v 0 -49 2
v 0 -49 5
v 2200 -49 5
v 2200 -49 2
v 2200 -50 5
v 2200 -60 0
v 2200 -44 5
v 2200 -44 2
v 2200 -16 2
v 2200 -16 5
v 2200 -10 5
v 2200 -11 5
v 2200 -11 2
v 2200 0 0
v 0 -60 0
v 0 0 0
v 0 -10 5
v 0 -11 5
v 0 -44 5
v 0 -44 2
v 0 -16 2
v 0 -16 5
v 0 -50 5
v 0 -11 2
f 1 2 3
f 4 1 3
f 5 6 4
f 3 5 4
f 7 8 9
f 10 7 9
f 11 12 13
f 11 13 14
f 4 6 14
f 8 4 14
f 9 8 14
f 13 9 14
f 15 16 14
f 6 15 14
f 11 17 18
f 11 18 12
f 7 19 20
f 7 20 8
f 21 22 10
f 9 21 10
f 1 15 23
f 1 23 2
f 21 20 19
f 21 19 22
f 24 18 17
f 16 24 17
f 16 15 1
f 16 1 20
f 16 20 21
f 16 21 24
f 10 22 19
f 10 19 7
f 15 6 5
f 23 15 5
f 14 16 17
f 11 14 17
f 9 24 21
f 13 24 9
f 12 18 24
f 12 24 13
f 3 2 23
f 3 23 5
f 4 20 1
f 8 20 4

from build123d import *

# Parameters (mm, degrees)
SKETCH_1_W          = 2200
SKETCH_1_H          = 60
EXTRUDE_1_DEPTH     = 5
CHAMFER_1_SIZE      = 5
CHAMFER_1_SIZE_2    = 10
SKETCH_2_W          = 2200
SKETCH_2_H          = 5
CUT_EXTRUDE_2_DEPTH = 3


with BuildPart() as part:
    # Эскиз1 → Бобышка-Вытянуть1 (new body)
    with BuildSketch(Plane.XY):
        with Locations((1100, -30)):
            Rectangle(SKETCH_1_W, SKETCH_1_H)
    extrude(amount=EXTRUDE_1_DEPTH)

    # Фаска1
    # the kernel refuses this chamfer: 10, 5 mm, written as the material it takes off along each edge
    with BuildSketch(Plane(origin=(2225.898288738, 0, 5), x_dir=(0, 0.06891834360170877, -0.9976223042390326), z_dir=(-1, 0, 0)), Plane(origin=(-25.898288738, -60, 5), x_dir=(0, -0.06891834360170909, -0.9976223042390324), z_dir=(1, 0, 0))) as chamfer_1_piece_1:
        Polygon((CHAMFER_1_SIZE * 0.997622304239, CHAMFER_1_SIZE * 0.0689183436017), (-CHAMFER_1_SIZE_2 * 0.0689183436017, CHAMFER_1_SIZE_2 * 0.997622304239), (0, 0), align=None)
    extrude(amount=2251.796577476, mode=Mode.SUBTRACT)

    # Эскиз2 → Вырез-Вытянуть2 (cut)
    with BuildSketch(Plane.XY.offset(5)):
        with Locations((1100, -46.5)):
            Rectangle(SKETCH_2_W, SKETCH_2_H)
        with Locations((1100, -13.5)):
            Rectangle(SKETCH_2_W, SKETCH_2_H)
    extrude(amount=-CUT_EXTRUDE_2_DEPTH, mode=Mode.SUBTRACT)


solid = part.part
